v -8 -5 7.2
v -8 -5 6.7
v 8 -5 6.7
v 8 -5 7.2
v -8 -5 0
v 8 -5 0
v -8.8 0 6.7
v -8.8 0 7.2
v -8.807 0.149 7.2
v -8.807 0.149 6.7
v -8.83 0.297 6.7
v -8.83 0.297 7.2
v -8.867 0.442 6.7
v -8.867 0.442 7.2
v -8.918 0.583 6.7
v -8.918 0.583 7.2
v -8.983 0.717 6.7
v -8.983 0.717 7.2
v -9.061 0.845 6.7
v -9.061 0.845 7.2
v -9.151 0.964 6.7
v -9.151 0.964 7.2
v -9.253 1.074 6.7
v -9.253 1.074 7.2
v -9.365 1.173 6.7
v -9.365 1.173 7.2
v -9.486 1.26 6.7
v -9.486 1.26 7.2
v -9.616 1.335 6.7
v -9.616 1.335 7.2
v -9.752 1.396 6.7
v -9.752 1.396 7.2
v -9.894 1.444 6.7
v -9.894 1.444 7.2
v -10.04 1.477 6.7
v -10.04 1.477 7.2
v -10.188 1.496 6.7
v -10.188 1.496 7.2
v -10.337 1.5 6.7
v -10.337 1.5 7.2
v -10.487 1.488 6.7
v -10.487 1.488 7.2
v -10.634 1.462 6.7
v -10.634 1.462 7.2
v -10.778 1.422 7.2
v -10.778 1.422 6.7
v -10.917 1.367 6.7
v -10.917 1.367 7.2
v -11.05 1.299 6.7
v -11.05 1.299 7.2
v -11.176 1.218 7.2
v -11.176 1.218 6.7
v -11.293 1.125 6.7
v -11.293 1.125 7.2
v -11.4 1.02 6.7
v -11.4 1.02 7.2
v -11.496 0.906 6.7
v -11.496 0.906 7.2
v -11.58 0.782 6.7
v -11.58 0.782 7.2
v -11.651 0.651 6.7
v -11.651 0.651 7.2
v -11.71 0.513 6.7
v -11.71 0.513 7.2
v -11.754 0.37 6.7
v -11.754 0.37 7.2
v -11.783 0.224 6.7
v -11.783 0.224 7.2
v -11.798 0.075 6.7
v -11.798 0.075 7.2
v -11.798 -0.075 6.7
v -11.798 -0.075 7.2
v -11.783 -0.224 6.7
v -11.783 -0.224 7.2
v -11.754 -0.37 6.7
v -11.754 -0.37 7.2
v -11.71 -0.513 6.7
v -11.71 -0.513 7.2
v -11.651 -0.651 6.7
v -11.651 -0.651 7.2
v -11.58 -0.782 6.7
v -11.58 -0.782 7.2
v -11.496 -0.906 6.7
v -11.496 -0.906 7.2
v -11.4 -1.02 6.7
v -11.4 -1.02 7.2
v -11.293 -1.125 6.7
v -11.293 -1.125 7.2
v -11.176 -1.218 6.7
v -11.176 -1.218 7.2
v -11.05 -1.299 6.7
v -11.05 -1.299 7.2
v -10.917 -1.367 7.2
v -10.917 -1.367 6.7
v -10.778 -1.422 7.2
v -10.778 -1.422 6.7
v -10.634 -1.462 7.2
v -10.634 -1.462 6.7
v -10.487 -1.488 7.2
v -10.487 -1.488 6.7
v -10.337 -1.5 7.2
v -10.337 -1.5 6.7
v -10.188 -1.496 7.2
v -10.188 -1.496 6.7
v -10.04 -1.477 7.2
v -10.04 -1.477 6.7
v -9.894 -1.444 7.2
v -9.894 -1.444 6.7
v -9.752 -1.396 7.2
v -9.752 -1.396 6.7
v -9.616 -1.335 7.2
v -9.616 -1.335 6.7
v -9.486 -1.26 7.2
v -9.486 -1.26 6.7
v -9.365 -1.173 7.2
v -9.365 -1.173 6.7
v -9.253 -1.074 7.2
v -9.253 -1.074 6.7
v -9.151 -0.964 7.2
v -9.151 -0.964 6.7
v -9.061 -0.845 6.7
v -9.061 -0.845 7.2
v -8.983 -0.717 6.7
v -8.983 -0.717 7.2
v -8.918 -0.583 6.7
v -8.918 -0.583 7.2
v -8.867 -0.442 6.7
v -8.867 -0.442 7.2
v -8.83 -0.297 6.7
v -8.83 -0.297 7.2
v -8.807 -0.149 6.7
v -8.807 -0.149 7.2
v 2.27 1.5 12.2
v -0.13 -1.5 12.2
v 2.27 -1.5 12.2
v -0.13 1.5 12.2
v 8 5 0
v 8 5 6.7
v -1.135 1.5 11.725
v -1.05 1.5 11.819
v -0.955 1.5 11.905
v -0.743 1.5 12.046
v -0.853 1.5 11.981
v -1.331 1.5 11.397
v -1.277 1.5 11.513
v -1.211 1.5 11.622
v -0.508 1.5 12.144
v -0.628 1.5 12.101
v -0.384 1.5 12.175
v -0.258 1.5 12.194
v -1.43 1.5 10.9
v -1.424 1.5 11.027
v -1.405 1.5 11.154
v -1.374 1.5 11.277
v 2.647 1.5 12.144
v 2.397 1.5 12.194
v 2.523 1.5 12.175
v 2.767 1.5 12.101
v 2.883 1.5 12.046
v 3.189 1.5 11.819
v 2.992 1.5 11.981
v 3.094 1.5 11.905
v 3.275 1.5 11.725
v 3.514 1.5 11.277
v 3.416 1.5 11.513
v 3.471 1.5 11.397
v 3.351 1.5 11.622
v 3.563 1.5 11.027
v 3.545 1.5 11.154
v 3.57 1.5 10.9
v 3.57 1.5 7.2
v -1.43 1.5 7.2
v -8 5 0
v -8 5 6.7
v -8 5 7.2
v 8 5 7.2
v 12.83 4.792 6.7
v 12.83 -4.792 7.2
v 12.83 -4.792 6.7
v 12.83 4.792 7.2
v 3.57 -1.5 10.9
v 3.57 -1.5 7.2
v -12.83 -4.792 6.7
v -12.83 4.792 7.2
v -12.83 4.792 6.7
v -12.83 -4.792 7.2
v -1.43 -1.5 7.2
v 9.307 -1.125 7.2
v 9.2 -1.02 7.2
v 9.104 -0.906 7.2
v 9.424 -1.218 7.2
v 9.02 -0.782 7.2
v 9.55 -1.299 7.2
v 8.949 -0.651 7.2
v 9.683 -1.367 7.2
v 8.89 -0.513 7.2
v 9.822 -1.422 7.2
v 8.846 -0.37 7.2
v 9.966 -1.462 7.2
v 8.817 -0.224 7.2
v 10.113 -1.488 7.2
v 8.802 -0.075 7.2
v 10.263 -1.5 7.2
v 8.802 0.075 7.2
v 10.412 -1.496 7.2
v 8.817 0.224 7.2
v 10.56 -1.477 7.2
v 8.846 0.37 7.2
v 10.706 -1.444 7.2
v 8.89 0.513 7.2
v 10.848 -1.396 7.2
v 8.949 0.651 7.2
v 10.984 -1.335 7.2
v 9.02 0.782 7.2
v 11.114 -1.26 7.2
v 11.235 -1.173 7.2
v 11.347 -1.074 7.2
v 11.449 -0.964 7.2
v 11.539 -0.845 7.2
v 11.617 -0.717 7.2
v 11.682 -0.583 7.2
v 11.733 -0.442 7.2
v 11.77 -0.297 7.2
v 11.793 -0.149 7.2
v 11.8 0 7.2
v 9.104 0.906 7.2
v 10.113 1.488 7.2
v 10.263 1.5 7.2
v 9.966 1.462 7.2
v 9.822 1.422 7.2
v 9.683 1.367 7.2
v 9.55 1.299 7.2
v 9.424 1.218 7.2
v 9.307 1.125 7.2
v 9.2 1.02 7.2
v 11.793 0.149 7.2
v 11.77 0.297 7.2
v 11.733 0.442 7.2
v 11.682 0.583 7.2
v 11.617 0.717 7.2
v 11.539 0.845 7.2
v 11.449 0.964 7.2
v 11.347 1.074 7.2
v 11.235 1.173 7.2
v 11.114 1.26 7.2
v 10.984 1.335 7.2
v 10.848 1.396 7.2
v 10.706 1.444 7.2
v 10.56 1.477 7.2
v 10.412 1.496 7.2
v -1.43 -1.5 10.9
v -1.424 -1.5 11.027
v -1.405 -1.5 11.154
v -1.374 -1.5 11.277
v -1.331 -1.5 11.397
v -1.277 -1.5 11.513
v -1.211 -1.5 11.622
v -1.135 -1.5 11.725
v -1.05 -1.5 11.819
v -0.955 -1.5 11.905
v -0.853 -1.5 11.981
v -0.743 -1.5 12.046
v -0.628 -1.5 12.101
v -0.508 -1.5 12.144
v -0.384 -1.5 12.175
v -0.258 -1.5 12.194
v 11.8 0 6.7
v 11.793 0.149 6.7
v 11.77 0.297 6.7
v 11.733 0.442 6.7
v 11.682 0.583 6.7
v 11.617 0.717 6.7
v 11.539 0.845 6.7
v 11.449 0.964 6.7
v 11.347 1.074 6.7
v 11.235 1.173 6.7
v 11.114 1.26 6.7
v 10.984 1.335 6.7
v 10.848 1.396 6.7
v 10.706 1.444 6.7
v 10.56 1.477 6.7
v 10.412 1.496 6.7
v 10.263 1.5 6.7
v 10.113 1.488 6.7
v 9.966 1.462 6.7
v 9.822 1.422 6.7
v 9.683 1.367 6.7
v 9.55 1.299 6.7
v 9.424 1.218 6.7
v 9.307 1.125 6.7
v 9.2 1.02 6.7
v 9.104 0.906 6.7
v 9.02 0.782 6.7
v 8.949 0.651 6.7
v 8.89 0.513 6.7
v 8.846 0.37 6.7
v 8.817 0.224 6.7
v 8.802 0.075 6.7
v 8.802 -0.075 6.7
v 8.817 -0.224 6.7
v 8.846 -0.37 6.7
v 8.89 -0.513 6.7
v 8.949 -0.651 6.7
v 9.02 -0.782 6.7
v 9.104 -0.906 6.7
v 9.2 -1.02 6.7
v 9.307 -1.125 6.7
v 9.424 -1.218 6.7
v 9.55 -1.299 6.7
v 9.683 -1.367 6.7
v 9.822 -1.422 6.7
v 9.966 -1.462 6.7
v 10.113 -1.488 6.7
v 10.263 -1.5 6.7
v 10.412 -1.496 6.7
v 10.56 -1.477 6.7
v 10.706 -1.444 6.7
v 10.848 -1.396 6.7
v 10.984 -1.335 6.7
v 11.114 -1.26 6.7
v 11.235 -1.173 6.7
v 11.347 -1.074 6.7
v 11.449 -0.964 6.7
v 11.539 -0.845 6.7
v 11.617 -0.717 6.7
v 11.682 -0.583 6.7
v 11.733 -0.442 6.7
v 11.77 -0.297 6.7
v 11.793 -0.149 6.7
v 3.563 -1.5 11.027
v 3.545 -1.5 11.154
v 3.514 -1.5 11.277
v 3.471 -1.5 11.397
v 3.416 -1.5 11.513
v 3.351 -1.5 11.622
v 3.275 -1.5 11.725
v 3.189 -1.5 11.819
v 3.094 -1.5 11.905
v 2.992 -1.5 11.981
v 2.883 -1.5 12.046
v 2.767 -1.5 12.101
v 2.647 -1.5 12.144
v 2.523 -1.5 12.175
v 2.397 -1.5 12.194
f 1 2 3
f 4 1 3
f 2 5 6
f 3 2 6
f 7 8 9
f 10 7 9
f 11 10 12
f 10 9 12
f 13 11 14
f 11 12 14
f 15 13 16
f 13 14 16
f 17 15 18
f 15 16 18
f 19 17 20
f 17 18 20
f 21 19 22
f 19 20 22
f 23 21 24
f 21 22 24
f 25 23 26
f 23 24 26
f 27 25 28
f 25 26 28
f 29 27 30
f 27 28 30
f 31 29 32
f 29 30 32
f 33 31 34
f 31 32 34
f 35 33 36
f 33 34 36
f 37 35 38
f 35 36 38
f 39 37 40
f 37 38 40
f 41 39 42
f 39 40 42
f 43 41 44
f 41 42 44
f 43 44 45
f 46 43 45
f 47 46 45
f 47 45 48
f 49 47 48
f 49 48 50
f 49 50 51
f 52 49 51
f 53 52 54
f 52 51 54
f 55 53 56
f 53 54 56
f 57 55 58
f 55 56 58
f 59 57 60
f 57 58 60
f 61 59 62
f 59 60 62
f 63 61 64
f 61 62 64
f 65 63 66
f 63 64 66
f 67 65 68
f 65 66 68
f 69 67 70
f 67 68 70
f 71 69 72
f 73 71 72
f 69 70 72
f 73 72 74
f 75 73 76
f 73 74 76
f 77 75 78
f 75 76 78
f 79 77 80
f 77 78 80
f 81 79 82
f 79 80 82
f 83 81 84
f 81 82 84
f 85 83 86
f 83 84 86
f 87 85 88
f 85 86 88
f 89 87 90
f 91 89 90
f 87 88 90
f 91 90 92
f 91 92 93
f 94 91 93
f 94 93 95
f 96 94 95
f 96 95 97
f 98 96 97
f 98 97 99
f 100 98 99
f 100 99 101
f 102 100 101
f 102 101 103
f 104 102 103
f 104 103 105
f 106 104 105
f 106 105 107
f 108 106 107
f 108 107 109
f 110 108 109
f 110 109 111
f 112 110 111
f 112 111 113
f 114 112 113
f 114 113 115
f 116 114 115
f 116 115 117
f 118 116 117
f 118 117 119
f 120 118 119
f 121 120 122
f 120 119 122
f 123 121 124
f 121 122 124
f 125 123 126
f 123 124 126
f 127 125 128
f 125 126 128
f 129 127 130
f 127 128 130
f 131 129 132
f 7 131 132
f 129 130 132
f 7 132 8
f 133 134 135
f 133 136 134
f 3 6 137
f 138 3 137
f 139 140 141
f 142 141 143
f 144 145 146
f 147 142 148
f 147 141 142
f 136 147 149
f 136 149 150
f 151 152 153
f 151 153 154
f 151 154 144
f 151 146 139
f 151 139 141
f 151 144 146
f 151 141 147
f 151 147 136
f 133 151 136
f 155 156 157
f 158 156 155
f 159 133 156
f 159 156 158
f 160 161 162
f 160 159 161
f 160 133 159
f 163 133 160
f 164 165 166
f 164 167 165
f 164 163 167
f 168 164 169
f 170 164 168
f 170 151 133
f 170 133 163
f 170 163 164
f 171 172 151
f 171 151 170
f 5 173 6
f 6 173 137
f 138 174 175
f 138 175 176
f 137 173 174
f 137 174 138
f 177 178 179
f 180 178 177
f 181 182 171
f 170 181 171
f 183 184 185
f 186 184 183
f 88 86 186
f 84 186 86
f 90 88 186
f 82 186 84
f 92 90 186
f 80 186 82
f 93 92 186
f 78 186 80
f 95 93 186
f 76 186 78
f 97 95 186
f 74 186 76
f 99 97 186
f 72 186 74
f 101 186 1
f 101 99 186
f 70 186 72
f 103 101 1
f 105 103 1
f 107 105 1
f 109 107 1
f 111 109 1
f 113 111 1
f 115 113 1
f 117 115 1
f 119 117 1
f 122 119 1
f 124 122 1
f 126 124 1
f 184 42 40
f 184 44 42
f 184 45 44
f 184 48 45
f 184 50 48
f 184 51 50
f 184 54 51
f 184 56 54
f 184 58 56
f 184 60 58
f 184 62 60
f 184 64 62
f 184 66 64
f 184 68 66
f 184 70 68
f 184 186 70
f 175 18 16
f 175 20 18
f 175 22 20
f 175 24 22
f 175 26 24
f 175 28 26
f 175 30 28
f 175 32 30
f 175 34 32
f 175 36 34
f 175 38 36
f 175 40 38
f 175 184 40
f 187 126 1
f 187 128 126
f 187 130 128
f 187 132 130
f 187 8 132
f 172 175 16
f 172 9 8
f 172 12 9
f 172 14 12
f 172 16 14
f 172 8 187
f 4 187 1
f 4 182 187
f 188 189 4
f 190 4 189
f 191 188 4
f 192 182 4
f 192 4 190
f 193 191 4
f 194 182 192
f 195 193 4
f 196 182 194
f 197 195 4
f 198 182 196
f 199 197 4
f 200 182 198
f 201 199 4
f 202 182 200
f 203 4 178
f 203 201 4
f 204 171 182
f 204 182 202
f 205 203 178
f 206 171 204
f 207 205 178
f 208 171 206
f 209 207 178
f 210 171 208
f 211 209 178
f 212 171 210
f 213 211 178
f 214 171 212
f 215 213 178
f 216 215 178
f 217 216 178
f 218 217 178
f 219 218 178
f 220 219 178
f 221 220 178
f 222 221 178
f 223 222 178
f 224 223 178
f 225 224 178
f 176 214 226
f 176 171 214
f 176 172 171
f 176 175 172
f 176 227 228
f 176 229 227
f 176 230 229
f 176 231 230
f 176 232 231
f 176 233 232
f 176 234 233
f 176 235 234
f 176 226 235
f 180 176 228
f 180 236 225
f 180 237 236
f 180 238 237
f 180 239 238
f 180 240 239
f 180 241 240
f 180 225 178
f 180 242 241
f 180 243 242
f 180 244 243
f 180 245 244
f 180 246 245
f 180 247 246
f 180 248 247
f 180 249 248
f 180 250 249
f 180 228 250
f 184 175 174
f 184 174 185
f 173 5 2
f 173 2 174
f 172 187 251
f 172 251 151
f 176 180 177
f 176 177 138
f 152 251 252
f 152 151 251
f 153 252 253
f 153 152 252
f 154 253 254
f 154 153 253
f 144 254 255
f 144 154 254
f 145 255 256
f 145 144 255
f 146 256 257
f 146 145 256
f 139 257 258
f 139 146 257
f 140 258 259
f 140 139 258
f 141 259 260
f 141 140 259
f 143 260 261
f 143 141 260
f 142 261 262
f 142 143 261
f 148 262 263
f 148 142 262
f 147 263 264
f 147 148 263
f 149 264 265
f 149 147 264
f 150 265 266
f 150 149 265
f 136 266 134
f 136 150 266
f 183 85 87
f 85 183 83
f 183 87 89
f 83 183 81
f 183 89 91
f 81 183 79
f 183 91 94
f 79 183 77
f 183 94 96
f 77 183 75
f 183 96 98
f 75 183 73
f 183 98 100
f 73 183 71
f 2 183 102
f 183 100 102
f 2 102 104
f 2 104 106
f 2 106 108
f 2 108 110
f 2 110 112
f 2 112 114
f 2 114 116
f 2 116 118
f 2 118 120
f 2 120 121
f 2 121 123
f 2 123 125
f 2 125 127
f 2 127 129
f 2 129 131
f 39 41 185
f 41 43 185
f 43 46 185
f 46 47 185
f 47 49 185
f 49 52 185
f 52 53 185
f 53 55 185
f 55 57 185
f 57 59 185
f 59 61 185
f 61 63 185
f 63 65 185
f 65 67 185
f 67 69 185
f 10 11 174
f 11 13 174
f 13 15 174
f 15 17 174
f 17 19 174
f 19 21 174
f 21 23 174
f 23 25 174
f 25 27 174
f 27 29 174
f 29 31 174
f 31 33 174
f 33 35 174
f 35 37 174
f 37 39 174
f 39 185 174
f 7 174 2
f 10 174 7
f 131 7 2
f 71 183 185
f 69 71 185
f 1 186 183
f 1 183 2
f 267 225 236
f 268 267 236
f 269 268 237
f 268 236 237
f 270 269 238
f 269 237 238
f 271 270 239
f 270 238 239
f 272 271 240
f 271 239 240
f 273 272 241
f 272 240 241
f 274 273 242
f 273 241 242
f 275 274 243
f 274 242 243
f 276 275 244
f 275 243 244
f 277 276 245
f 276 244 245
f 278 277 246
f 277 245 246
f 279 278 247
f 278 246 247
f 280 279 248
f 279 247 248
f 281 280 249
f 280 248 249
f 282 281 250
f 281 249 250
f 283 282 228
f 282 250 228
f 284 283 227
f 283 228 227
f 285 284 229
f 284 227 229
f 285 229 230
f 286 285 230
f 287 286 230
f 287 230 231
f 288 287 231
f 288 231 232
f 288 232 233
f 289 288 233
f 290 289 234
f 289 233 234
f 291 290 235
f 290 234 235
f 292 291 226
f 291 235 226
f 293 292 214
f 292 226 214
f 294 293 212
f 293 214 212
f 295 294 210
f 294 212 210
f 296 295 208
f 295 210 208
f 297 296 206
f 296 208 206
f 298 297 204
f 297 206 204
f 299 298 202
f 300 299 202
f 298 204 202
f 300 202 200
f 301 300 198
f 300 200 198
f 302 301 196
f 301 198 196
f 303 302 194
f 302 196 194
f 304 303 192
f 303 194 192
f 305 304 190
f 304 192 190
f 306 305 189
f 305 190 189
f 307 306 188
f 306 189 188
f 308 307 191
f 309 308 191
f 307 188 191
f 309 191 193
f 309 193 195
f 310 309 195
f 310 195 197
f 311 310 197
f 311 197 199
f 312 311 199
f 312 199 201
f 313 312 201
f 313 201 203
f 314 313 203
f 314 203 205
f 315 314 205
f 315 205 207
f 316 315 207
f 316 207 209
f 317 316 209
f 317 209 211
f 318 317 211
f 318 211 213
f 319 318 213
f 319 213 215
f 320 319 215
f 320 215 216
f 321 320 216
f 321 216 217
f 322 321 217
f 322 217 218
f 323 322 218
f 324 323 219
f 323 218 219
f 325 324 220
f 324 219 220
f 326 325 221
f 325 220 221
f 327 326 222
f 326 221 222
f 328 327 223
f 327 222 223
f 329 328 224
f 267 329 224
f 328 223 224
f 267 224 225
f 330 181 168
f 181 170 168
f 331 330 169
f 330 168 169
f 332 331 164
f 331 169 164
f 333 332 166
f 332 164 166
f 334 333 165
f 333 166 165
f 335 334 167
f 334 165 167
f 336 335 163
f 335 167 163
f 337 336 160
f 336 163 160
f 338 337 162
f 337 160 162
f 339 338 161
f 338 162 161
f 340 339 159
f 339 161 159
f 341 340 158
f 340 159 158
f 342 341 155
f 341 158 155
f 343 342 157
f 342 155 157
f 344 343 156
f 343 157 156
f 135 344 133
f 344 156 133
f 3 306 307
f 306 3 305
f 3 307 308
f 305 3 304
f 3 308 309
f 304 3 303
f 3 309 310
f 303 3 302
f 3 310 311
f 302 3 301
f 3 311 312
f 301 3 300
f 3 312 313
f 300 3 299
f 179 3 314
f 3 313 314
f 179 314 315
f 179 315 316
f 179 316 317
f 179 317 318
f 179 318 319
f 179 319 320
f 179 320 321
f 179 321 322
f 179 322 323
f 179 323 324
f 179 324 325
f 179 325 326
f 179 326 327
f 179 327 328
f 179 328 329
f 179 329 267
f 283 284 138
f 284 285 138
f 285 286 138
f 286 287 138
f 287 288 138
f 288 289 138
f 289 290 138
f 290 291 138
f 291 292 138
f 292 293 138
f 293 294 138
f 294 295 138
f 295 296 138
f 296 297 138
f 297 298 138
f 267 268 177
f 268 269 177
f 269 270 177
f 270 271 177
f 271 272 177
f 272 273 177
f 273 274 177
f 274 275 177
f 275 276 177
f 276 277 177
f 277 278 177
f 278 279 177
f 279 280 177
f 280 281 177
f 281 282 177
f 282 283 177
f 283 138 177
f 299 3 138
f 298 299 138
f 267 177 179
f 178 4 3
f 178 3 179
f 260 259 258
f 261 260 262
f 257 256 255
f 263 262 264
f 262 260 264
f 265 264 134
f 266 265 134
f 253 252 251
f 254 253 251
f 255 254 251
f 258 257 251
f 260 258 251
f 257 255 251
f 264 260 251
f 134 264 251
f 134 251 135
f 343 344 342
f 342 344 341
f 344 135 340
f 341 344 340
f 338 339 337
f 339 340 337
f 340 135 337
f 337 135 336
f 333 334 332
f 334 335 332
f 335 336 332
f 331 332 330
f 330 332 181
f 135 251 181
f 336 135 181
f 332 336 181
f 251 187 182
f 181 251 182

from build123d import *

# Parameters (mm, degrees)
F0_W     = 16
F0_H     = 10
F1_DEPTH = 7.2
F2_W     = 5
F2_H     = 3
F3_DEPTH = 5
F4_R     = 1.3
F5_R     = 1.5
F6_DEPTH = 0.5


with BuildPart() as f1:
    # F0 (on Top) → F1 (new body)
    with BuildSketch(Plane.XY):
        Rectangle(F0_W, F0_H)
    extrude(amount=F1_DEPTH)

    # F2 (on face) → F3 (join)
    with BuildSketch(Plane.XY.offset(7.2)):
        with Locations((1.069713, 0)):
            Rectangle(F2_W, F2_H)
    extrude(amount=F3_DEPTH)

    # F4
    f4_edges = [f1.edges().sort_by_distance(p)[0] for p in [
        (-1.430287, 0, 12.2),
        (3.569713, 0, 12.2),
    ]]
    fillet(f4_edges, radius=F4_R)

    # F5 (on face) → F6 (join)
    with BuildSketch(Plane.XY.offset(7.2)):
        Polygon((0, 5), (-8, 5), (-12.830287, 4.792277), (-12.830287, 0), (-12.830287, -4.792277), (-8, -5), (0, -5), (8, -5), (12.830287, -4.792277), (12.830287, 0), (12.830287, 4.792277), (8, 5), align=None)
        with Locations((-10.3, 0)):
            Circle(F5_R, mode=Mode.SUBTRACT)
        with Locations((10.3, 0)):
            Circle(F5_R, mode=Mode.SUBTRACT)
    extrude(amount=-F6_DEPTH)


solid = f1.part
